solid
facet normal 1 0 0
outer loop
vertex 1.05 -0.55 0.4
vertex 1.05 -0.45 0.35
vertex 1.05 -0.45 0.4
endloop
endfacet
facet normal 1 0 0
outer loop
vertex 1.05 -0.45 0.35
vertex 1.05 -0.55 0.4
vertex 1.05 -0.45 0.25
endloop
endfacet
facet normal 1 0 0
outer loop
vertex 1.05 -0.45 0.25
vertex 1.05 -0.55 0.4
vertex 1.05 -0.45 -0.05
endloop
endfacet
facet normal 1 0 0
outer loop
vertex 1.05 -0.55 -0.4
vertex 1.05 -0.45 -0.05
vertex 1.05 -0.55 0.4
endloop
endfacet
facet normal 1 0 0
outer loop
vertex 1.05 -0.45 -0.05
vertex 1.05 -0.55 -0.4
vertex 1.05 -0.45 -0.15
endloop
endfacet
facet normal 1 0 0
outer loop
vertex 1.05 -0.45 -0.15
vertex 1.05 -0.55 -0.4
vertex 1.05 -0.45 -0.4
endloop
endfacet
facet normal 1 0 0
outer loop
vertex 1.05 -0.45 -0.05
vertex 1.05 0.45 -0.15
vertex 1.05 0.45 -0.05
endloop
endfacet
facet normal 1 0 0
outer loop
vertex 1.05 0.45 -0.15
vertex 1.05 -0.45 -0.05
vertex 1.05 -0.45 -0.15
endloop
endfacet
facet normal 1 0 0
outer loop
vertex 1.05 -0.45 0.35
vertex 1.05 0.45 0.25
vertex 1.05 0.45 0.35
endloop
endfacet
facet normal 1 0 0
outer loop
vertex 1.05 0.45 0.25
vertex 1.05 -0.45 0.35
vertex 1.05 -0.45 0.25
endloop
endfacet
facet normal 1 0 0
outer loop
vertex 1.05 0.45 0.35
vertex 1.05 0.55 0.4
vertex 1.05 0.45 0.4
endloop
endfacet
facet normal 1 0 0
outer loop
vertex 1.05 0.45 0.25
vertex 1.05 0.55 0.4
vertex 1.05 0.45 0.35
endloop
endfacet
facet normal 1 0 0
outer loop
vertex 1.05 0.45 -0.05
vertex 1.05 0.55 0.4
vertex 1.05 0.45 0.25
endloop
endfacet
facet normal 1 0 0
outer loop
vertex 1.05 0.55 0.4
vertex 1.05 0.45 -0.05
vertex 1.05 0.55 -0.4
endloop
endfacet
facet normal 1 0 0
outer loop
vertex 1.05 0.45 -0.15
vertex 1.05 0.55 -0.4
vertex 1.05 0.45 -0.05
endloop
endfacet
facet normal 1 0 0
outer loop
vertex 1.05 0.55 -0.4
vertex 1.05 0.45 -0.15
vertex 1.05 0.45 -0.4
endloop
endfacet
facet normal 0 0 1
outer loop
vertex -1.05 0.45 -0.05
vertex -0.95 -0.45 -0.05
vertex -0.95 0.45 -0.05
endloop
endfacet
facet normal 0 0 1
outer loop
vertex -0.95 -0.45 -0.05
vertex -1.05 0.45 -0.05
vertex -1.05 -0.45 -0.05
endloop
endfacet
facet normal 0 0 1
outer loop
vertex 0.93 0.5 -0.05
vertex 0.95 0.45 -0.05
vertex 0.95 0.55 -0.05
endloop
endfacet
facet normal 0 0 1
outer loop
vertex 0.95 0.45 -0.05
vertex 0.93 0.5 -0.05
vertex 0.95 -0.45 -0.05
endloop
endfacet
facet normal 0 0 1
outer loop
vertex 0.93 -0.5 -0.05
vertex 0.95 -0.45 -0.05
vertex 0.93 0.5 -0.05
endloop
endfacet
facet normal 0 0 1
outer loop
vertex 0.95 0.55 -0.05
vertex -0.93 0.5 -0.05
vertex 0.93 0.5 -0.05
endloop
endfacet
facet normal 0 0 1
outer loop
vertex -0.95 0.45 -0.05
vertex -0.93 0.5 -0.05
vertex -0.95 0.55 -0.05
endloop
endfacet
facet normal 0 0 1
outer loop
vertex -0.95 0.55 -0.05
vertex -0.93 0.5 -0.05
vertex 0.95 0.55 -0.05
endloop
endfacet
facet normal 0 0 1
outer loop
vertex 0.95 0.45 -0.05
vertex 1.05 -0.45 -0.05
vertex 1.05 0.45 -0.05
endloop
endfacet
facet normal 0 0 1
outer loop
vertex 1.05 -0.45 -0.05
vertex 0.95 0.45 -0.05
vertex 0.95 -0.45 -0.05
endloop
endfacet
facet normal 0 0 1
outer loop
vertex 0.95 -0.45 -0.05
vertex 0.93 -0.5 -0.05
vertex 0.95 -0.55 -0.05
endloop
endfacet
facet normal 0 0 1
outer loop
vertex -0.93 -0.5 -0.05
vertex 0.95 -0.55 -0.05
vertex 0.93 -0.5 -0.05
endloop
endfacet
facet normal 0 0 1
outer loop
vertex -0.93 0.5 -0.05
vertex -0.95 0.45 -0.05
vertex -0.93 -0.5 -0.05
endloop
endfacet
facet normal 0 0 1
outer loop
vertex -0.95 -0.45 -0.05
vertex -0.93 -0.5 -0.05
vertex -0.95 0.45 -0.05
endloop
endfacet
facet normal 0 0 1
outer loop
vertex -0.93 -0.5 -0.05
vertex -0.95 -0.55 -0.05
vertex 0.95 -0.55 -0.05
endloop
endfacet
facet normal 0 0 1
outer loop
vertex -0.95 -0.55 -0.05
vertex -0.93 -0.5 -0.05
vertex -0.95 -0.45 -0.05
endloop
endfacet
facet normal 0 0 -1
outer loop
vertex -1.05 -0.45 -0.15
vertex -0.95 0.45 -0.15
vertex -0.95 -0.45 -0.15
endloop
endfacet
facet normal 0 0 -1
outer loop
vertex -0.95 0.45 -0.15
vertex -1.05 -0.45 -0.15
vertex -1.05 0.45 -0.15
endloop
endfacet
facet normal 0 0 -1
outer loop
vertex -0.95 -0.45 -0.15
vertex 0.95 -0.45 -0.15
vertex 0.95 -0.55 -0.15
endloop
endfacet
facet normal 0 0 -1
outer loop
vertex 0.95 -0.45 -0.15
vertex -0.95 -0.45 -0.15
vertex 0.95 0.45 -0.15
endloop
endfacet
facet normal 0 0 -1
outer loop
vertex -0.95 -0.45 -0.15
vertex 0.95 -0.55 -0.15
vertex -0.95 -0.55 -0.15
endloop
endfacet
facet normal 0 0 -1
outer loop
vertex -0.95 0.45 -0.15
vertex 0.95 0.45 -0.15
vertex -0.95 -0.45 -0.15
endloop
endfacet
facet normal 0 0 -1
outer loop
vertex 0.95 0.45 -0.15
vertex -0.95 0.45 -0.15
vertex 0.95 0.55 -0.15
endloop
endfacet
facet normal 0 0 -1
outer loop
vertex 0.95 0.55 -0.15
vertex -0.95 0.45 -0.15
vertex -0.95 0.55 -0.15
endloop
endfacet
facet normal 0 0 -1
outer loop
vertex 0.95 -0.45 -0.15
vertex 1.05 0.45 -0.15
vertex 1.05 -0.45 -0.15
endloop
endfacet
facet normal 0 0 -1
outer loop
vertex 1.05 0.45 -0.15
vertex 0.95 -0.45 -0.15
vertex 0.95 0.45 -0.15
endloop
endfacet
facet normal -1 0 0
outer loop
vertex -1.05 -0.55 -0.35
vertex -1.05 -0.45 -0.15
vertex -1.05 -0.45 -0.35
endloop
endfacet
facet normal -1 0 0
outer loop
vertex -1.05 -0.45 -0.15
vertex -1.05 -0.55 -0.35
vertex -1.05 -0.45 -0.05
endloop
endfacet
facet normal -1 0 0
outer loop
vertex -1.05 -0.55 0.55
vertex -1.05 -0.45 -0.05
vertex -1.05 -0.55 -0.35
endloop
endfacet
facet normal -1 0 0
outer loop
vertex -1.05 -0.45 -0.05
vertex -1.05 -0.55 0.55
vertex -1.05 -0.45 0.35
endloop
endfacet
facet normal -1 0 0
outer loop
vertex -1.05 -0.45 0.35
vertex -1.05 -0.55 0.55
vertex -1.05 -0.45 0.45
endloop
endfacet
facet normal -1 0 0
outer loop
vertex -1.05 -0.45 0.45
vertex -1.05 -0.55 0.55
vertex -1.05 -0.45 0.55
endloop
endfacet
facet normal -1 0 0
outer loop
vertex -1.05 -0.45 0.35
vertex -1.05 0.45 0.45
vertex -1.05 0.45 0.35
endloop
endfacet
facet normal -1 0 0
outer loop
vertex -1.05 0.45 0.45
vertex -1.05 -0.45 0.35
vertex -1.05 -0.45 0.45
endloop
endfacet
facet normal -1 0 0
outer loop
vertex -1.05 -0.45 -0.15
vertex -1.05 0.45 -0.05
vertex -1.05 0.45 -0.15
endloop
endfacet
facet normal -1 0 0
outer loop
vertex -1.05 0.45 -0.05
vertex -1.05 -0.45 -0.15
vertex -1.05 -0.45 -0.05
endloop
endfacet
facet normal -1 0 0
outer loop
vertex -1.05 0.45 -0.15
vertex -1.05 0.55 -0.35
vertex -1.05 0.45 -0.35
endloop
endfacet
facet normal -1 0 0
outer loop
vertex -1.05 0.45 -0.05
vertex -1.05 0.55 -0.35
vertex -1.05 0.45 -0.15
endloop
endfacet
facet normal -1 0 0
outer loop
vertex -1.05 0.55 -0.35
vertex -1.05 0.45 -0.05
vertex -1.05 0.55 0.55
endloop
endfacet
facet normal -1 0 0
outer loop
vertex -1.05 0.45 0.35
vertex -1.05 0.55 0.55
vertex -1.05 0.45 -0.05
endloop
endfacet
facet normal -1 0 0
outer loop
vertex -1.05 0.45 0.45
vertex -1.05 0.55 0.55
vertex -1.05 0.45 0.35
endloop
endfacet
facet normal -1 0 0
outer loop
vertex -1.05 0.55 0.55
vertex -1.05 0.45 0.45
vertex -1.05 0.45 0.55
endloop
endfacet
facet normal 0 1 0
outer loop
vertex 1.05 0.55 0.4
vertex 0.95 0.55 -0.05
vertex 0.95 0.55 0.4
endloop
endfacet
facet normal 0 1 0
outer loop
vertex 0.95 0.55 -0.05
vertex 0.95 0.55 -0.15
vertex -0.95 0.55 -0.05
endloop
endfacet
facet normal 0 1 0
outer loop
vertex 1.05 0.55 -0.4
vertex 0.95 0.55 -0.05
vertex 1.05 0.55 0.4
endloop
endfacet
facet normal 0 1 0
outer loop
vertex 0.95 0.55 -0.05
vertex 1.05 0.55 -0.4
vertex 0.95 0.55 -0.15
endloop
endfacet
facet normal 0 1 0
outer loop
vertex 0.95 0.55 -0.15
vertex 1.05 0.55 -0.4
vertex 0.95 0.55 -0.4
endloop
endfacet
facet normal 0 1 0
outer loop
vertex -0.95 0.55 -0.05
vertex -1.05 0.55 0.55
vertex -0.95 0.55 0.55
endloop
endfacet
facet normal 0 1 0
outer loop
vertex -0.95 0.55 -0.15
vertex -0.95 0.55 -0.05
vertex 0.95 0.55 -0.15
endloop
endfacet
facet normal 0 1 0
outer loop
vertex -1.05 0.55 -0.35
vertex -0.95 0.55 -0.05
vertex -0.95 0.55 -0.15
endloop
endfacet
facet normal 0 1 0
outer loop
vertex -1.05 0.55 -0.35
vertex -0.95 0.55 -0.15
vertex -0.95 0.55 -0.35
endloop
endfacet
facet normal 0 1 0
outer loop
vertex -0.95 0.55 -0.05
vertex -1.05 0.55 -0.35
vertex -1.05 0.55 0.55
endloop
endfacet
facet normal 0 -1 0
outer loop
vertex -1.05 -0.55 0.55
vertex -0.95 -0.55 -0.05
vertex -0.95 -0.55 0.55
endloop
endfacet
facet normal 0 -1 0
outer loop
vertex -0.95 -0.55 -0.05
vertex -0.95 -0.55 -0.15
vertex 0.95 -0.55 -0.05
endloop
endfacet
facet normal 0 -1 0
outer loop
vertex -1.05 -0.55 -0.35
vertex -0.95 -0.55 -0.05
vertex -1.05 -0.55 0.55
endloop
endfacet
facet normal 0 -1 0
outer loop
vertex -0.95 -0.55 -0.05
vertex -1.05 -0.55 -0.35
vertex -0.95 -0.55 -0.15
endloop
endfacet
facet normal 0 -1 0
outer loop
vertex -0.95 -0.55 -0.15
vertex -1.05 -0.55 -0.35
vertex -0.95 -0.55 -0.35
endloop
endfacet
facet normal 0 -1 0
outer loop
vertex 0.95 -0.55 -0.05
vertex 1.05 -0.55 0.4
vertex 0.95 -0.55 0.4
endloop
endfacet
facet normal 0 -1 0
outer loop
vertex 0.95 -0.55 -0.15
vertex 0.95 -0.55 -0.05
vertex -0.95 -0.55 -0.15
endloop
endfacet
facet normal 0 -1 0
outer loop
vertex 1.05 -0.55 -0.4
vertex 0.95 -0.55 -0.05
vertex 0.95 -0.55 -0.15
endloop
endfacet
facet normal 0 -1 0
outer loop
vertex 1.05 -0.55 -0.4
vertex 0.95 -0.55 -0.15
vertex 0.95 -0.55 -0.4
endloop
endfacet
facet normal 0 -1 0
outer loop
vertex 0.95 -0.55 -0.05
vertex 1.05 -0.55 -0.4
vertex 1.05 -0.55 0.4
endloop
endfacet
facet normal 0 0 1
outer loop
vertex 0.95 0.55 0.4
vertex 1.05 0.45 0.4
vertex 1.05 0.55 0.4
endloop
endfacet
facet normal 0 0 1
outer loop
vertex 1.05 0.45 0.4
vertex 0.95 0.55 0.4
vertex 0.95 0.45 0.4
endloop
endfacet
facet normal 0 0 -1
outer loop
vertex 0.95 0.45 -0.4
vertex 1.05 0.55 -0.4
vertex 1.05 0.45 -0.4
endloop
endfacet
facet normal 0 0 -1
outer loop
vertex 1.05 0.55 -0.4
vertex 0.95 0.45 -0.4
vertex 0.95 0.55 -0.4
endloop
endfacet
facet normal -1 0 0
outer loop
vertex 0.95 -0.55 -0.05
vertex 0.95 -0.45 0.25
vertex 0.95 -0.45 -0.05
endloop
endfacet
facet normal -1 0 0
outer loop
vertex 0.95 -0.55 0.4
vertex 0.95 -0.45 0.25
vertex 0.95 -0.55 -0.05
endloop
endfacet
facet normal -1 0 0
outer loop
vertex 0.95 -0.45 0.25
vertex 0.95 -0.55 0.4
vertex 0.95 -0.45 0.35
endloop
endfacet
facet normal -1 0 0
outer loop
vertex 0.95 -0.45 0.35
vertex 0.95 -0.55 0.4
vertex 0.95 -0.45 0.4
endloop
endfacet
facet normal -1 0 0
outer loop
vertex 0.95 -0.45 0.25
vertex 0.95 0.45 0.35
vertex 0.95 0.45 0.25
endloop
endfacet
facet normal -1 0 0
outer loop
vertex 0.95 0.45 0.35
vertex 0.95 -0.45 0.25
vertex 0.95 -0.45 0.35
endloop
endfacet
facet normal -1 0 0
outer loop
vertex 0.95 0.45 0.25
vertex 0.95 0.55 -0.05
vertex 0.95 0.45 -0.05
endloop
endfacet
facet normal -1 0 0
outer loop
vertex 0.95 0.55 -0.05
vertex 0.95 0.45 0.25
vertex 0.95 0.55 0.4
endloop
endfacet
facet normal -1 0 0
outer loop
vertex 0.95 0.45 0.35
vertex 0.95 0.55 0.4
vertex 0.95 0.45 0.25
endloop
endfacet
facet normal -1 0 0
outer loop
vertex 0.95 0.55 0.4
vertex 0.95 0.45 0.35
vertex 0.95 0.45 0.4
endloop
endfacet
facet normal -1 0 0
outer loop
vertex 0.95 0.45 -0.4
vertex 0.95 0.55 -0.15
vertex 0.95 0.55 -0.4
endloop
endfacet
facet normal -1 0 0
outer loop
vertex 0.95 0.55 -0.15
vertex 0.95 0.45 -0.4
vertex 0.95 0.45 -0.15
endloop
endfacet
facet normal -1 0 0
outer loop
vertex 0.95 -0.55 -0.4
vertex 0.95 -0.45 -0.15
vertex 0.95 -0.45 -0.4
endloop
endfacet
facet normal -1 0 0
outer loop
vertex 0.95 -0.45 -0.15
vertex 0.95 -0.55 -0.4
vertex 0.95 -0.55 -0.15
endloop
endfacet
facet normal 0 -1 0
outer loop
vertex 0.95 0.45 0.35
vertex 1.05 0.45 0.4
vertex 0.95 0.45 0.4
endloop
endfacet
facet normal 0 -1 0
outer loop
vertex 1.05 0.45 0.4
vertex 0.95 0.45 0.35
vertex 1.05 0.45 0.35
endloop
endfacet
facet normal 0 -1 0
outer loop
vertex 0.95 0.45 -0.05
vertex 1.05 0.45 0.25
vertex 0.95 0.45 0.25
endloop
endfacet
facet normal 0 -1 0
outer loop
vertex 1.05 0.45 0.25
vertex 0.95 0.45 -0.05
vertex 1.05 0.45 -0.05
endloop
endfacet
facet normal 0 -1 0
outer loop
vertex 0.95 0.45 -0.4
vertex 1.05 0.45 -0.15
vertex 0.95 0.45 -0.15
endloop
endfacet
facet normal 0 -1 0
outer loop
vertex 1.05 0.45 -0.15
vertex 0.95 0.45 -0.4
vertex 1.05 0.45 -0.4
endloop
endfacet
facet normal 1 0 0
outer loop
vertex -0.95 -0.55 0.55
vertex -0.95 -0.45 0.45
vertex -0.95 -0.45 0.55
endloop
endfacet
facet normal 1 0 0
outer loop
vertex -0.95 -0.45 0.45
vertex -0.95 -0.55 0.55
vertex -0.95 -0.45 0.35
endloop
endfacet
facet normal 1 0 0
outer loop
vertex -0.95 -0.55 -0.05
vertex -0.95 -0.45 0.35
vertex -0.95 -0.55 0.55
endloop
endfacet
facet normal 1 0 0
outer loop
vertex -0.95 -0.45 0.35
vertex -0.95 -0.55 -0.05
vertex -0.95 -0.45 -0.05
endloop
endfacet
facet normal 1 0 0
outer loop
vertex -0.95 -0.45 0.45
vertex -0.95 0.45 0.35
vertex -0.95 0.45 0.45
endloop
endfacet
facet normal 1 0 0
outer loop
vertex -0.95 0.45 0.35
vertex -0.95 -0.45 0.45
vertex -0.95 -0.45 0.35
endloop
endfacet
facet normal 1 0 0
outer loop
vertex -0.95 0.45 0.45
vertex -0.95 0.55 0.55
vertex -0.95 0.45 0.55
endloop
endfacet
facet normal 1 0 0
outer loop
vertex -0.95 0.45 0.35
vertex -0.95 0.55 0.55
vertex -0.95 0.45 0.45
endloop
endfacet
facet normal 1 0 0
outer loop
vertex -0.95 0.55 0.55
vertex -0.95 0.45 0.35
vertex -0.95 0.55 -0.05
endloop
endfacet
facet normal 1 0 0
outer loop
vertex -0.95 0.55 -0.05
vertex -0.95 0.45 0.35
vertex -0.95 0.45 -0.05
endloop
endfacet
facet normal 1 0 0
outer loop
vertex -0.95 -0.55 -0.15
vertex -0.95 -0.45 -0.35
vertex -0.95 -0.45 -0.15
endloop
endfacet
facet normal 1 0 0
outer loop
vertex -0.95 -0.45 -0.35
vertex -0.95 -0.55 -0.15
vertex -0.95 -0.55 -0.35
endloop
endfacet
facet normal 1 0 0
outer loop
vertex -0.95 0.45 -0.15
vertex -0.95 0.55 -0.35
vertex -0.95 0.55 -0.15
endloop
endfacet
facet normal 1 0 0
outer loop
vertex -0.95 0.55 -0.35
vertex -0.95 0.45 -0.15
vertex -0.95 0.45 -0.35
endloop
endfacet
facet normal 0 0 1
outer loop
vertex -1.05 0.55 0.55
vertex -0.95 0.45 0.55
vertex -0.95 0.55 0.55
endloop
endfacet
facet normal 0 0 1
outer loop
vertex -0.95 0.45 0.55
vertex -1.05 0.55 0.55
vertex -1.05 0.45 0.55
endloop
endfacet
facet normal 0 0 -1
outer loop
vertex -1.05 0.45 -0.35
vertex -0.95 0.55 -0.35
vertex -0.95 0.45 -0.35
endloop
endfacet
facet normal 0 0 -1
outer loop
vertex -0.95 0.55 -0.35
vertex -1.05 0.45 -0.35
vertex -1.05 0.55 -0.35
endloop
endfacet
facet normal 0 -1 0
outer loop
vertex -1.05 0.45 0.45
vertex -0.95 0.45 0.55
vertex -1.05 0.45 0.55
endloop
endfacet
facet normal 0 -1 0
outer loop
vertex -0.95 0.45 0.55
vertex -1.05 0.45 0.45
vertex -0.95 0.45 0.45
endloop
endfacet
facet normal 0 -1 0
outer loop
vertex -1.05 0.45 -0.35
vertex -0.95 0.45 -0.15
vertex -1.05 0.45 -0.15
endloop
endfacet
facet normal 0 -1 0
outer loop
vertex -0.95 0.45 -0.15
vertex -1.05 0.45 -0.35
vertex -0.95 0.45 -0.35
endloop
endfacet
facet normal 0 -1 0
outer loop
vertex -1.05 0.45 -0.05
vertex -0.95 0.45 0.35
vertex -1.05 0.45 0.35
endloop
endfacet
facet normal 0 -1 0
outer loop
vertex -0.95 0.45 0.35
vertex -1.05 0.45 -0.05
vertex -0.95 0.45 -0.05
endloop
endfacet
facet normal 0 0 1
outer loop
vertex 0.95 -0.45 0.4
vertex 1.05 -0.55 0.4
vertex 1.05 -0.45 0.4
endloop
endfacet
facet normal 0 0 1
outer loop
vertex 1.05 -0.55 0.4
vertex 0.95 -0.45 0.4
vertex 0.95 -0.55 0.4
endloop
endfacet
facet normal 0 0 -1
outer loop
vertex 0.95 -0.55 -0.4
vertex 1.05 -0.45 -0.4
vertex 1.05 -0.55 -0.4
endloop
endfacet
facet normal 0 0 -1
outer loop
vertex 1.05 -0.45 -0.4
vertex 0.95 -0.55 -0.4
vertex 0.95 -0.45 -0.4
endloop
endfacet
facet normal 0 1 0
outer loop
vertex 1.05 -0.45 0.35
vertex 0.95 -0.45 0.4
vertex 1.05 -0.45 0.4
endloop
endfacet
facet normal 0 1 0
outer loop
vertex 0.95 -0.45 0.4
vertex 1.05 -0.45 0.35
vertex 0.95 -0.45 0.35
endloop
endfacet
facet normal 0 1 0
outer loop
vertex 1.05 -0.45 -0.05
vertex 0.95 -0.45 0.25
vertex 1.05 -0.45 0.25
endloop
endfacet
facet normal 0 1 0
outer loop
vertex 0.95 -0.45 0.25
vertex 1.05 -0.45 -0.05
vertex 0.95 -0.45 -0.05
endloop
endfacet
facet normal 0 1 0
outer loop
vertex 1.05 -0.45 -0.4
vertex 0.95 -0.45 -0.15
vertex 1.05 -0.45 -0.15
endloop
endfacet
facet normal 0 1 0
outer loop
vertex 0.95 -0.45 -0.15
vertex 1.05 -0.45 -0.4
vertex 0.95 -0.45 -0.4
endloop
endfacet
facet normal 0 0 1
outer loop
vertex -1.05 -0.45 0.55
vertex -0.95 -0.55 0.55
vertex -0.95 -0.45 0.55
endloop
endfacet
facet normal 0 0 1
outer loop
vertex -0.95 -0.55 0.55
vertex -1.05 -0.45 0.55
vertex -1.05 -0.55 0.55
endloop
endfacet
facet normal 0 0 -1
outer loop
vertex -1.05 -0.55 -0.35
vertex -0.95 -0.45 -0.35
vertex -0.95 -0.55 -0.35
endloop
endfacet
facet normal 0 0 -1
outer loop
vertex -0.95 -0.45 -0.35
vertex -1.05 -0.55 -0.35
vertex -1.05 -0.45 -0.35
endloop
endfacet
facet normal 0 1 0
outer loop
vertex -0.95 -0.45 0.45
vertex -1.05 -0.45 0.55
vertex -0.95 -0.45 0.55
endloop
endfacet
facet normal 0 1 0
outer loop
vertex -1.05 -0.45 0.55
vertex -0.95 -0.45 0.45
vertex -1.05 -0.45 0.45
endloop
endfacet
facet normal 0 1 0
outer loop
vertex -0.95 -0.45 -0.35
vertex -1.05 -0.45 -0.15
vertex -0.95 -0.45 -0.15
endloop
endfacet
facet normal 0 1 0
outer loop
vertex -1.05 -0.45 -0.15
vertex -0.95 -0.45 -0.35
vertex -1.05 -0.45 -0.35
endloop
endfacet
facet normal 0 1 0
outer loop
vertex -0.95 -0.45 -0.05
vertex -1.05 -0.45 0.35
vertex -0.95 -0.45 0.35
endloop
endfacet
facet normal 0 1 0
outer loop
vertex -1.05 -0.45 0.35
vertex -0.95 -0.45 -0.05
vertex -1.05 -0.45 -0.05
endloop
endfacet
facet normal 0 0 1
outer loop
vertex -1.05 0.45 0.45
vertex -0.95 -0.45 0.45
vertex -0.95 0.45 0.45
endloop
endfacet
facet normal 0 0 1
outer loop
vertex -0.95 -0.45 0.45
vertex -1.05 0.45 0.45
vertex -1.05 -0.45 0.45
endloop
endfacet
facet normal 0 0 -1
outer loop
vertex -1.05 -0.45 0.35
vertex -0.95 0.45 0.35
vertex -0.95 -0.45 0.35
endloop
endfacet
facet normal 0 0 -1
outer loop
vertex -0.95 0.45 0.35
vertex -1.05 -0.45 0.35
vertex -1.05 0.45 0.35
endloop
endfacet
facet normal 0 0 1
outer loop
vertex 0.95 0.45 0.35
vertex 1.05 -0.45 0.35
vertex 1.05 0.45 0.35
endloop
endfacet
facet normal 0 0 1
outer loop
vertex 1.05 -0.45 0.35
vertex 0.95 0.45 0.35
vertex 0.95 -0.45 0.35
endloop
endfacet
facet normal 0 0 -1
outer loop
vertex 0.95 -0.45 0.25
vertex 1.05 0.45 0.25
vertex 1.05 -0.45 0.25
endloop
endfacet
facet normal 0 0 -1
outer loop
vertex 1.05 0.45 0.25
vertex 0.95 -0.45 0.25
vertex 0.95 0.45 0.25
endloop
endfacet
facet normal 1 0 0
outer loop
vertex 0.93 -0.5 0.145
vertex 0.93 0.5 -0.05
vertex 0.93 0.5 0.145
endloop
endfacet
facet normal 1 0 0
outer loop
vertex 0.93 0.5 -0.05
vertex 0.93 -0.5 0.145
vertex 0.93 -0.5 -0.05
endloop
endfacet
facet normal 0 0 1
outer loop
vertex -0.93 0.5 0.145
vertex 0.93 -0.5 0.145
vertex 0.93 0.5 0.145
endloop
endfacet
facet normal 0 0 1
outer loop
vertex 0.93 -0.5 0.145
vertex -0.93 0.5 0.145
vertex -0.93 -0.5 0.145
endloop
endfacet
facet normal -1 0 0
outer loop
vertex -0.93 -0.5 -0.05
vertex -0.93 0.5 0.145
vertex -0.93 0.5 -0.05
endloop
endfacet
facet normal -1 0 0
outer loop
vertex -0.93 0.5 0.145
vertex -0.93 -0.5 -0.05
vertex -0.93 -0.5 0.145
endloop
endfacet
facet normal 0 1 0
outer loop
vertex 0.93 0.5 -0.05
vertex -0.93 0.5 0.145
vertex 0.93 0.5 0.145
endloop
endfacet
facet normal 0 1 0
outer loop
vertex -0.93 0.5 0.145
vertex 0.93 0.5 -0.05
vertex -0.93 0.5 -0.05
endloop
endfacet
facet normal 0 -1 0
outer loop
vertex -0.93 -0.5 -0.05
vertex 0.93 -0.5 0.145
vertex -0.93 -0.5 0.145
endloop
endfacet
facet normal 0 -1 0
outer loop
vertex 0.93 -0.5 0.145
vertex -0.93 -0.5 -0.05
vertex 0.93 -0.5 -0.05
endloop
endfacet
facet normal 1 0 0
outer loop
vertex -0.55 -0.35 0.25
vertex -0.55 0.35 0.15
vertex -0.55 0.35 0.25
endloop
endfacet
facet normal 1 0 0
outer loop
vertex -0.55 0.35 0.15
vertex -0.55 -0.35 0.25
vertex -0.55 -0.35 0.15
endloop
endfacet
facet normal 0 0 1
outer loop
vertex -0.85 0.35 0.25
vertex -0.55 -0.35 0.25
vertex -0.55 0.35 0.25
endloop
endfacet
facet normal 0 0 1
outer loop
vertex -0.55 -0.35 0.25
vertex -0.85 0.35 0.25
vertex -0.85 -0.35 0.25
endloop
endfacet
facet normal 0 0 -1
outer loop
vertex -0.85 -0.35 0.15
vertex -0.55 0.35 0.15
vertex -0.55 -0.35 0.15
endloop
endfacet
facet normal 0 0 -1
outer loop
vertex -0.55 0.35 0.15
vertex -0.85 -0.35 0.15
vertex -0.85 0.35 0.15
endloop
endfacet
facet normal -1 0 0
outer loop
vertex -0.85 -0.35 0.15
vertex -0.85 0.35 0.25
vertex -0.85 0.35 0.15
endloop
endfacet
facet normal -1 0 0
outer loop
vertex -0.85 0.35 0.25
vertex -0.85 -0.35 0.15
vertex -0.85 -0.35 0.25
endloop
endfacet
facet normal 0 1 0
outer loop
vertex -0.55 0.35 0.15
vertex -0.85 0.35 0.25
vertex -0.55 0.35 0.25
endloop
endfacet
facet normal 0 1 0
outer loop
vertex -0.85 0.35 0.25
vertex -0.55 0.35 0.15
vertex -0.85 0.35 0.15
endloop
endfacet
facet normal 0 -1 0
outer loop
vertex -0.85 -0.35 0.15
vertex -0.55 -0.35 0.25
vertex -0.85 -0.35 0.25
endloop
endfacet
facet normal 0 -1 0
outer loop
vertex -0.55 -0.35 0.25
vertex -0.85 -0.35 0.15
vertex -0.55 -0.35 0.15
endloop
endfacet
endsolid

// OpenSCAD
color("#bbeedd")
cube([1.86,1,0.29], center = true);

color("#cdaa7d"){
    translate([0,0,-0.1])
    cube([2.1,1.1,0.1], center = true);


    translate([1,0.5,0])
    cube([0.1,0.1,0.8], center = true);

    translate([-1,0.5,0.1])
    cube([0.1,0.1,0.9], center = true);

    translate([1,-0.5,0])
    cube([0.1,0.1,0.8], center = true);

    translate([-1,-0.5,0.1])
    cube([0.1,0.1,0.9], center = true);


   translate([-1,0,0.4])
   cube([0.1,0.9,0.1], center = true);
    
   translate([1,0,0.3])
   cube([0.1,0.9,0.1], center = true);


}




color("white"){
translate([-0.7,0,0.2])
cube([0.3,0.7,0.1], center = true);
}
